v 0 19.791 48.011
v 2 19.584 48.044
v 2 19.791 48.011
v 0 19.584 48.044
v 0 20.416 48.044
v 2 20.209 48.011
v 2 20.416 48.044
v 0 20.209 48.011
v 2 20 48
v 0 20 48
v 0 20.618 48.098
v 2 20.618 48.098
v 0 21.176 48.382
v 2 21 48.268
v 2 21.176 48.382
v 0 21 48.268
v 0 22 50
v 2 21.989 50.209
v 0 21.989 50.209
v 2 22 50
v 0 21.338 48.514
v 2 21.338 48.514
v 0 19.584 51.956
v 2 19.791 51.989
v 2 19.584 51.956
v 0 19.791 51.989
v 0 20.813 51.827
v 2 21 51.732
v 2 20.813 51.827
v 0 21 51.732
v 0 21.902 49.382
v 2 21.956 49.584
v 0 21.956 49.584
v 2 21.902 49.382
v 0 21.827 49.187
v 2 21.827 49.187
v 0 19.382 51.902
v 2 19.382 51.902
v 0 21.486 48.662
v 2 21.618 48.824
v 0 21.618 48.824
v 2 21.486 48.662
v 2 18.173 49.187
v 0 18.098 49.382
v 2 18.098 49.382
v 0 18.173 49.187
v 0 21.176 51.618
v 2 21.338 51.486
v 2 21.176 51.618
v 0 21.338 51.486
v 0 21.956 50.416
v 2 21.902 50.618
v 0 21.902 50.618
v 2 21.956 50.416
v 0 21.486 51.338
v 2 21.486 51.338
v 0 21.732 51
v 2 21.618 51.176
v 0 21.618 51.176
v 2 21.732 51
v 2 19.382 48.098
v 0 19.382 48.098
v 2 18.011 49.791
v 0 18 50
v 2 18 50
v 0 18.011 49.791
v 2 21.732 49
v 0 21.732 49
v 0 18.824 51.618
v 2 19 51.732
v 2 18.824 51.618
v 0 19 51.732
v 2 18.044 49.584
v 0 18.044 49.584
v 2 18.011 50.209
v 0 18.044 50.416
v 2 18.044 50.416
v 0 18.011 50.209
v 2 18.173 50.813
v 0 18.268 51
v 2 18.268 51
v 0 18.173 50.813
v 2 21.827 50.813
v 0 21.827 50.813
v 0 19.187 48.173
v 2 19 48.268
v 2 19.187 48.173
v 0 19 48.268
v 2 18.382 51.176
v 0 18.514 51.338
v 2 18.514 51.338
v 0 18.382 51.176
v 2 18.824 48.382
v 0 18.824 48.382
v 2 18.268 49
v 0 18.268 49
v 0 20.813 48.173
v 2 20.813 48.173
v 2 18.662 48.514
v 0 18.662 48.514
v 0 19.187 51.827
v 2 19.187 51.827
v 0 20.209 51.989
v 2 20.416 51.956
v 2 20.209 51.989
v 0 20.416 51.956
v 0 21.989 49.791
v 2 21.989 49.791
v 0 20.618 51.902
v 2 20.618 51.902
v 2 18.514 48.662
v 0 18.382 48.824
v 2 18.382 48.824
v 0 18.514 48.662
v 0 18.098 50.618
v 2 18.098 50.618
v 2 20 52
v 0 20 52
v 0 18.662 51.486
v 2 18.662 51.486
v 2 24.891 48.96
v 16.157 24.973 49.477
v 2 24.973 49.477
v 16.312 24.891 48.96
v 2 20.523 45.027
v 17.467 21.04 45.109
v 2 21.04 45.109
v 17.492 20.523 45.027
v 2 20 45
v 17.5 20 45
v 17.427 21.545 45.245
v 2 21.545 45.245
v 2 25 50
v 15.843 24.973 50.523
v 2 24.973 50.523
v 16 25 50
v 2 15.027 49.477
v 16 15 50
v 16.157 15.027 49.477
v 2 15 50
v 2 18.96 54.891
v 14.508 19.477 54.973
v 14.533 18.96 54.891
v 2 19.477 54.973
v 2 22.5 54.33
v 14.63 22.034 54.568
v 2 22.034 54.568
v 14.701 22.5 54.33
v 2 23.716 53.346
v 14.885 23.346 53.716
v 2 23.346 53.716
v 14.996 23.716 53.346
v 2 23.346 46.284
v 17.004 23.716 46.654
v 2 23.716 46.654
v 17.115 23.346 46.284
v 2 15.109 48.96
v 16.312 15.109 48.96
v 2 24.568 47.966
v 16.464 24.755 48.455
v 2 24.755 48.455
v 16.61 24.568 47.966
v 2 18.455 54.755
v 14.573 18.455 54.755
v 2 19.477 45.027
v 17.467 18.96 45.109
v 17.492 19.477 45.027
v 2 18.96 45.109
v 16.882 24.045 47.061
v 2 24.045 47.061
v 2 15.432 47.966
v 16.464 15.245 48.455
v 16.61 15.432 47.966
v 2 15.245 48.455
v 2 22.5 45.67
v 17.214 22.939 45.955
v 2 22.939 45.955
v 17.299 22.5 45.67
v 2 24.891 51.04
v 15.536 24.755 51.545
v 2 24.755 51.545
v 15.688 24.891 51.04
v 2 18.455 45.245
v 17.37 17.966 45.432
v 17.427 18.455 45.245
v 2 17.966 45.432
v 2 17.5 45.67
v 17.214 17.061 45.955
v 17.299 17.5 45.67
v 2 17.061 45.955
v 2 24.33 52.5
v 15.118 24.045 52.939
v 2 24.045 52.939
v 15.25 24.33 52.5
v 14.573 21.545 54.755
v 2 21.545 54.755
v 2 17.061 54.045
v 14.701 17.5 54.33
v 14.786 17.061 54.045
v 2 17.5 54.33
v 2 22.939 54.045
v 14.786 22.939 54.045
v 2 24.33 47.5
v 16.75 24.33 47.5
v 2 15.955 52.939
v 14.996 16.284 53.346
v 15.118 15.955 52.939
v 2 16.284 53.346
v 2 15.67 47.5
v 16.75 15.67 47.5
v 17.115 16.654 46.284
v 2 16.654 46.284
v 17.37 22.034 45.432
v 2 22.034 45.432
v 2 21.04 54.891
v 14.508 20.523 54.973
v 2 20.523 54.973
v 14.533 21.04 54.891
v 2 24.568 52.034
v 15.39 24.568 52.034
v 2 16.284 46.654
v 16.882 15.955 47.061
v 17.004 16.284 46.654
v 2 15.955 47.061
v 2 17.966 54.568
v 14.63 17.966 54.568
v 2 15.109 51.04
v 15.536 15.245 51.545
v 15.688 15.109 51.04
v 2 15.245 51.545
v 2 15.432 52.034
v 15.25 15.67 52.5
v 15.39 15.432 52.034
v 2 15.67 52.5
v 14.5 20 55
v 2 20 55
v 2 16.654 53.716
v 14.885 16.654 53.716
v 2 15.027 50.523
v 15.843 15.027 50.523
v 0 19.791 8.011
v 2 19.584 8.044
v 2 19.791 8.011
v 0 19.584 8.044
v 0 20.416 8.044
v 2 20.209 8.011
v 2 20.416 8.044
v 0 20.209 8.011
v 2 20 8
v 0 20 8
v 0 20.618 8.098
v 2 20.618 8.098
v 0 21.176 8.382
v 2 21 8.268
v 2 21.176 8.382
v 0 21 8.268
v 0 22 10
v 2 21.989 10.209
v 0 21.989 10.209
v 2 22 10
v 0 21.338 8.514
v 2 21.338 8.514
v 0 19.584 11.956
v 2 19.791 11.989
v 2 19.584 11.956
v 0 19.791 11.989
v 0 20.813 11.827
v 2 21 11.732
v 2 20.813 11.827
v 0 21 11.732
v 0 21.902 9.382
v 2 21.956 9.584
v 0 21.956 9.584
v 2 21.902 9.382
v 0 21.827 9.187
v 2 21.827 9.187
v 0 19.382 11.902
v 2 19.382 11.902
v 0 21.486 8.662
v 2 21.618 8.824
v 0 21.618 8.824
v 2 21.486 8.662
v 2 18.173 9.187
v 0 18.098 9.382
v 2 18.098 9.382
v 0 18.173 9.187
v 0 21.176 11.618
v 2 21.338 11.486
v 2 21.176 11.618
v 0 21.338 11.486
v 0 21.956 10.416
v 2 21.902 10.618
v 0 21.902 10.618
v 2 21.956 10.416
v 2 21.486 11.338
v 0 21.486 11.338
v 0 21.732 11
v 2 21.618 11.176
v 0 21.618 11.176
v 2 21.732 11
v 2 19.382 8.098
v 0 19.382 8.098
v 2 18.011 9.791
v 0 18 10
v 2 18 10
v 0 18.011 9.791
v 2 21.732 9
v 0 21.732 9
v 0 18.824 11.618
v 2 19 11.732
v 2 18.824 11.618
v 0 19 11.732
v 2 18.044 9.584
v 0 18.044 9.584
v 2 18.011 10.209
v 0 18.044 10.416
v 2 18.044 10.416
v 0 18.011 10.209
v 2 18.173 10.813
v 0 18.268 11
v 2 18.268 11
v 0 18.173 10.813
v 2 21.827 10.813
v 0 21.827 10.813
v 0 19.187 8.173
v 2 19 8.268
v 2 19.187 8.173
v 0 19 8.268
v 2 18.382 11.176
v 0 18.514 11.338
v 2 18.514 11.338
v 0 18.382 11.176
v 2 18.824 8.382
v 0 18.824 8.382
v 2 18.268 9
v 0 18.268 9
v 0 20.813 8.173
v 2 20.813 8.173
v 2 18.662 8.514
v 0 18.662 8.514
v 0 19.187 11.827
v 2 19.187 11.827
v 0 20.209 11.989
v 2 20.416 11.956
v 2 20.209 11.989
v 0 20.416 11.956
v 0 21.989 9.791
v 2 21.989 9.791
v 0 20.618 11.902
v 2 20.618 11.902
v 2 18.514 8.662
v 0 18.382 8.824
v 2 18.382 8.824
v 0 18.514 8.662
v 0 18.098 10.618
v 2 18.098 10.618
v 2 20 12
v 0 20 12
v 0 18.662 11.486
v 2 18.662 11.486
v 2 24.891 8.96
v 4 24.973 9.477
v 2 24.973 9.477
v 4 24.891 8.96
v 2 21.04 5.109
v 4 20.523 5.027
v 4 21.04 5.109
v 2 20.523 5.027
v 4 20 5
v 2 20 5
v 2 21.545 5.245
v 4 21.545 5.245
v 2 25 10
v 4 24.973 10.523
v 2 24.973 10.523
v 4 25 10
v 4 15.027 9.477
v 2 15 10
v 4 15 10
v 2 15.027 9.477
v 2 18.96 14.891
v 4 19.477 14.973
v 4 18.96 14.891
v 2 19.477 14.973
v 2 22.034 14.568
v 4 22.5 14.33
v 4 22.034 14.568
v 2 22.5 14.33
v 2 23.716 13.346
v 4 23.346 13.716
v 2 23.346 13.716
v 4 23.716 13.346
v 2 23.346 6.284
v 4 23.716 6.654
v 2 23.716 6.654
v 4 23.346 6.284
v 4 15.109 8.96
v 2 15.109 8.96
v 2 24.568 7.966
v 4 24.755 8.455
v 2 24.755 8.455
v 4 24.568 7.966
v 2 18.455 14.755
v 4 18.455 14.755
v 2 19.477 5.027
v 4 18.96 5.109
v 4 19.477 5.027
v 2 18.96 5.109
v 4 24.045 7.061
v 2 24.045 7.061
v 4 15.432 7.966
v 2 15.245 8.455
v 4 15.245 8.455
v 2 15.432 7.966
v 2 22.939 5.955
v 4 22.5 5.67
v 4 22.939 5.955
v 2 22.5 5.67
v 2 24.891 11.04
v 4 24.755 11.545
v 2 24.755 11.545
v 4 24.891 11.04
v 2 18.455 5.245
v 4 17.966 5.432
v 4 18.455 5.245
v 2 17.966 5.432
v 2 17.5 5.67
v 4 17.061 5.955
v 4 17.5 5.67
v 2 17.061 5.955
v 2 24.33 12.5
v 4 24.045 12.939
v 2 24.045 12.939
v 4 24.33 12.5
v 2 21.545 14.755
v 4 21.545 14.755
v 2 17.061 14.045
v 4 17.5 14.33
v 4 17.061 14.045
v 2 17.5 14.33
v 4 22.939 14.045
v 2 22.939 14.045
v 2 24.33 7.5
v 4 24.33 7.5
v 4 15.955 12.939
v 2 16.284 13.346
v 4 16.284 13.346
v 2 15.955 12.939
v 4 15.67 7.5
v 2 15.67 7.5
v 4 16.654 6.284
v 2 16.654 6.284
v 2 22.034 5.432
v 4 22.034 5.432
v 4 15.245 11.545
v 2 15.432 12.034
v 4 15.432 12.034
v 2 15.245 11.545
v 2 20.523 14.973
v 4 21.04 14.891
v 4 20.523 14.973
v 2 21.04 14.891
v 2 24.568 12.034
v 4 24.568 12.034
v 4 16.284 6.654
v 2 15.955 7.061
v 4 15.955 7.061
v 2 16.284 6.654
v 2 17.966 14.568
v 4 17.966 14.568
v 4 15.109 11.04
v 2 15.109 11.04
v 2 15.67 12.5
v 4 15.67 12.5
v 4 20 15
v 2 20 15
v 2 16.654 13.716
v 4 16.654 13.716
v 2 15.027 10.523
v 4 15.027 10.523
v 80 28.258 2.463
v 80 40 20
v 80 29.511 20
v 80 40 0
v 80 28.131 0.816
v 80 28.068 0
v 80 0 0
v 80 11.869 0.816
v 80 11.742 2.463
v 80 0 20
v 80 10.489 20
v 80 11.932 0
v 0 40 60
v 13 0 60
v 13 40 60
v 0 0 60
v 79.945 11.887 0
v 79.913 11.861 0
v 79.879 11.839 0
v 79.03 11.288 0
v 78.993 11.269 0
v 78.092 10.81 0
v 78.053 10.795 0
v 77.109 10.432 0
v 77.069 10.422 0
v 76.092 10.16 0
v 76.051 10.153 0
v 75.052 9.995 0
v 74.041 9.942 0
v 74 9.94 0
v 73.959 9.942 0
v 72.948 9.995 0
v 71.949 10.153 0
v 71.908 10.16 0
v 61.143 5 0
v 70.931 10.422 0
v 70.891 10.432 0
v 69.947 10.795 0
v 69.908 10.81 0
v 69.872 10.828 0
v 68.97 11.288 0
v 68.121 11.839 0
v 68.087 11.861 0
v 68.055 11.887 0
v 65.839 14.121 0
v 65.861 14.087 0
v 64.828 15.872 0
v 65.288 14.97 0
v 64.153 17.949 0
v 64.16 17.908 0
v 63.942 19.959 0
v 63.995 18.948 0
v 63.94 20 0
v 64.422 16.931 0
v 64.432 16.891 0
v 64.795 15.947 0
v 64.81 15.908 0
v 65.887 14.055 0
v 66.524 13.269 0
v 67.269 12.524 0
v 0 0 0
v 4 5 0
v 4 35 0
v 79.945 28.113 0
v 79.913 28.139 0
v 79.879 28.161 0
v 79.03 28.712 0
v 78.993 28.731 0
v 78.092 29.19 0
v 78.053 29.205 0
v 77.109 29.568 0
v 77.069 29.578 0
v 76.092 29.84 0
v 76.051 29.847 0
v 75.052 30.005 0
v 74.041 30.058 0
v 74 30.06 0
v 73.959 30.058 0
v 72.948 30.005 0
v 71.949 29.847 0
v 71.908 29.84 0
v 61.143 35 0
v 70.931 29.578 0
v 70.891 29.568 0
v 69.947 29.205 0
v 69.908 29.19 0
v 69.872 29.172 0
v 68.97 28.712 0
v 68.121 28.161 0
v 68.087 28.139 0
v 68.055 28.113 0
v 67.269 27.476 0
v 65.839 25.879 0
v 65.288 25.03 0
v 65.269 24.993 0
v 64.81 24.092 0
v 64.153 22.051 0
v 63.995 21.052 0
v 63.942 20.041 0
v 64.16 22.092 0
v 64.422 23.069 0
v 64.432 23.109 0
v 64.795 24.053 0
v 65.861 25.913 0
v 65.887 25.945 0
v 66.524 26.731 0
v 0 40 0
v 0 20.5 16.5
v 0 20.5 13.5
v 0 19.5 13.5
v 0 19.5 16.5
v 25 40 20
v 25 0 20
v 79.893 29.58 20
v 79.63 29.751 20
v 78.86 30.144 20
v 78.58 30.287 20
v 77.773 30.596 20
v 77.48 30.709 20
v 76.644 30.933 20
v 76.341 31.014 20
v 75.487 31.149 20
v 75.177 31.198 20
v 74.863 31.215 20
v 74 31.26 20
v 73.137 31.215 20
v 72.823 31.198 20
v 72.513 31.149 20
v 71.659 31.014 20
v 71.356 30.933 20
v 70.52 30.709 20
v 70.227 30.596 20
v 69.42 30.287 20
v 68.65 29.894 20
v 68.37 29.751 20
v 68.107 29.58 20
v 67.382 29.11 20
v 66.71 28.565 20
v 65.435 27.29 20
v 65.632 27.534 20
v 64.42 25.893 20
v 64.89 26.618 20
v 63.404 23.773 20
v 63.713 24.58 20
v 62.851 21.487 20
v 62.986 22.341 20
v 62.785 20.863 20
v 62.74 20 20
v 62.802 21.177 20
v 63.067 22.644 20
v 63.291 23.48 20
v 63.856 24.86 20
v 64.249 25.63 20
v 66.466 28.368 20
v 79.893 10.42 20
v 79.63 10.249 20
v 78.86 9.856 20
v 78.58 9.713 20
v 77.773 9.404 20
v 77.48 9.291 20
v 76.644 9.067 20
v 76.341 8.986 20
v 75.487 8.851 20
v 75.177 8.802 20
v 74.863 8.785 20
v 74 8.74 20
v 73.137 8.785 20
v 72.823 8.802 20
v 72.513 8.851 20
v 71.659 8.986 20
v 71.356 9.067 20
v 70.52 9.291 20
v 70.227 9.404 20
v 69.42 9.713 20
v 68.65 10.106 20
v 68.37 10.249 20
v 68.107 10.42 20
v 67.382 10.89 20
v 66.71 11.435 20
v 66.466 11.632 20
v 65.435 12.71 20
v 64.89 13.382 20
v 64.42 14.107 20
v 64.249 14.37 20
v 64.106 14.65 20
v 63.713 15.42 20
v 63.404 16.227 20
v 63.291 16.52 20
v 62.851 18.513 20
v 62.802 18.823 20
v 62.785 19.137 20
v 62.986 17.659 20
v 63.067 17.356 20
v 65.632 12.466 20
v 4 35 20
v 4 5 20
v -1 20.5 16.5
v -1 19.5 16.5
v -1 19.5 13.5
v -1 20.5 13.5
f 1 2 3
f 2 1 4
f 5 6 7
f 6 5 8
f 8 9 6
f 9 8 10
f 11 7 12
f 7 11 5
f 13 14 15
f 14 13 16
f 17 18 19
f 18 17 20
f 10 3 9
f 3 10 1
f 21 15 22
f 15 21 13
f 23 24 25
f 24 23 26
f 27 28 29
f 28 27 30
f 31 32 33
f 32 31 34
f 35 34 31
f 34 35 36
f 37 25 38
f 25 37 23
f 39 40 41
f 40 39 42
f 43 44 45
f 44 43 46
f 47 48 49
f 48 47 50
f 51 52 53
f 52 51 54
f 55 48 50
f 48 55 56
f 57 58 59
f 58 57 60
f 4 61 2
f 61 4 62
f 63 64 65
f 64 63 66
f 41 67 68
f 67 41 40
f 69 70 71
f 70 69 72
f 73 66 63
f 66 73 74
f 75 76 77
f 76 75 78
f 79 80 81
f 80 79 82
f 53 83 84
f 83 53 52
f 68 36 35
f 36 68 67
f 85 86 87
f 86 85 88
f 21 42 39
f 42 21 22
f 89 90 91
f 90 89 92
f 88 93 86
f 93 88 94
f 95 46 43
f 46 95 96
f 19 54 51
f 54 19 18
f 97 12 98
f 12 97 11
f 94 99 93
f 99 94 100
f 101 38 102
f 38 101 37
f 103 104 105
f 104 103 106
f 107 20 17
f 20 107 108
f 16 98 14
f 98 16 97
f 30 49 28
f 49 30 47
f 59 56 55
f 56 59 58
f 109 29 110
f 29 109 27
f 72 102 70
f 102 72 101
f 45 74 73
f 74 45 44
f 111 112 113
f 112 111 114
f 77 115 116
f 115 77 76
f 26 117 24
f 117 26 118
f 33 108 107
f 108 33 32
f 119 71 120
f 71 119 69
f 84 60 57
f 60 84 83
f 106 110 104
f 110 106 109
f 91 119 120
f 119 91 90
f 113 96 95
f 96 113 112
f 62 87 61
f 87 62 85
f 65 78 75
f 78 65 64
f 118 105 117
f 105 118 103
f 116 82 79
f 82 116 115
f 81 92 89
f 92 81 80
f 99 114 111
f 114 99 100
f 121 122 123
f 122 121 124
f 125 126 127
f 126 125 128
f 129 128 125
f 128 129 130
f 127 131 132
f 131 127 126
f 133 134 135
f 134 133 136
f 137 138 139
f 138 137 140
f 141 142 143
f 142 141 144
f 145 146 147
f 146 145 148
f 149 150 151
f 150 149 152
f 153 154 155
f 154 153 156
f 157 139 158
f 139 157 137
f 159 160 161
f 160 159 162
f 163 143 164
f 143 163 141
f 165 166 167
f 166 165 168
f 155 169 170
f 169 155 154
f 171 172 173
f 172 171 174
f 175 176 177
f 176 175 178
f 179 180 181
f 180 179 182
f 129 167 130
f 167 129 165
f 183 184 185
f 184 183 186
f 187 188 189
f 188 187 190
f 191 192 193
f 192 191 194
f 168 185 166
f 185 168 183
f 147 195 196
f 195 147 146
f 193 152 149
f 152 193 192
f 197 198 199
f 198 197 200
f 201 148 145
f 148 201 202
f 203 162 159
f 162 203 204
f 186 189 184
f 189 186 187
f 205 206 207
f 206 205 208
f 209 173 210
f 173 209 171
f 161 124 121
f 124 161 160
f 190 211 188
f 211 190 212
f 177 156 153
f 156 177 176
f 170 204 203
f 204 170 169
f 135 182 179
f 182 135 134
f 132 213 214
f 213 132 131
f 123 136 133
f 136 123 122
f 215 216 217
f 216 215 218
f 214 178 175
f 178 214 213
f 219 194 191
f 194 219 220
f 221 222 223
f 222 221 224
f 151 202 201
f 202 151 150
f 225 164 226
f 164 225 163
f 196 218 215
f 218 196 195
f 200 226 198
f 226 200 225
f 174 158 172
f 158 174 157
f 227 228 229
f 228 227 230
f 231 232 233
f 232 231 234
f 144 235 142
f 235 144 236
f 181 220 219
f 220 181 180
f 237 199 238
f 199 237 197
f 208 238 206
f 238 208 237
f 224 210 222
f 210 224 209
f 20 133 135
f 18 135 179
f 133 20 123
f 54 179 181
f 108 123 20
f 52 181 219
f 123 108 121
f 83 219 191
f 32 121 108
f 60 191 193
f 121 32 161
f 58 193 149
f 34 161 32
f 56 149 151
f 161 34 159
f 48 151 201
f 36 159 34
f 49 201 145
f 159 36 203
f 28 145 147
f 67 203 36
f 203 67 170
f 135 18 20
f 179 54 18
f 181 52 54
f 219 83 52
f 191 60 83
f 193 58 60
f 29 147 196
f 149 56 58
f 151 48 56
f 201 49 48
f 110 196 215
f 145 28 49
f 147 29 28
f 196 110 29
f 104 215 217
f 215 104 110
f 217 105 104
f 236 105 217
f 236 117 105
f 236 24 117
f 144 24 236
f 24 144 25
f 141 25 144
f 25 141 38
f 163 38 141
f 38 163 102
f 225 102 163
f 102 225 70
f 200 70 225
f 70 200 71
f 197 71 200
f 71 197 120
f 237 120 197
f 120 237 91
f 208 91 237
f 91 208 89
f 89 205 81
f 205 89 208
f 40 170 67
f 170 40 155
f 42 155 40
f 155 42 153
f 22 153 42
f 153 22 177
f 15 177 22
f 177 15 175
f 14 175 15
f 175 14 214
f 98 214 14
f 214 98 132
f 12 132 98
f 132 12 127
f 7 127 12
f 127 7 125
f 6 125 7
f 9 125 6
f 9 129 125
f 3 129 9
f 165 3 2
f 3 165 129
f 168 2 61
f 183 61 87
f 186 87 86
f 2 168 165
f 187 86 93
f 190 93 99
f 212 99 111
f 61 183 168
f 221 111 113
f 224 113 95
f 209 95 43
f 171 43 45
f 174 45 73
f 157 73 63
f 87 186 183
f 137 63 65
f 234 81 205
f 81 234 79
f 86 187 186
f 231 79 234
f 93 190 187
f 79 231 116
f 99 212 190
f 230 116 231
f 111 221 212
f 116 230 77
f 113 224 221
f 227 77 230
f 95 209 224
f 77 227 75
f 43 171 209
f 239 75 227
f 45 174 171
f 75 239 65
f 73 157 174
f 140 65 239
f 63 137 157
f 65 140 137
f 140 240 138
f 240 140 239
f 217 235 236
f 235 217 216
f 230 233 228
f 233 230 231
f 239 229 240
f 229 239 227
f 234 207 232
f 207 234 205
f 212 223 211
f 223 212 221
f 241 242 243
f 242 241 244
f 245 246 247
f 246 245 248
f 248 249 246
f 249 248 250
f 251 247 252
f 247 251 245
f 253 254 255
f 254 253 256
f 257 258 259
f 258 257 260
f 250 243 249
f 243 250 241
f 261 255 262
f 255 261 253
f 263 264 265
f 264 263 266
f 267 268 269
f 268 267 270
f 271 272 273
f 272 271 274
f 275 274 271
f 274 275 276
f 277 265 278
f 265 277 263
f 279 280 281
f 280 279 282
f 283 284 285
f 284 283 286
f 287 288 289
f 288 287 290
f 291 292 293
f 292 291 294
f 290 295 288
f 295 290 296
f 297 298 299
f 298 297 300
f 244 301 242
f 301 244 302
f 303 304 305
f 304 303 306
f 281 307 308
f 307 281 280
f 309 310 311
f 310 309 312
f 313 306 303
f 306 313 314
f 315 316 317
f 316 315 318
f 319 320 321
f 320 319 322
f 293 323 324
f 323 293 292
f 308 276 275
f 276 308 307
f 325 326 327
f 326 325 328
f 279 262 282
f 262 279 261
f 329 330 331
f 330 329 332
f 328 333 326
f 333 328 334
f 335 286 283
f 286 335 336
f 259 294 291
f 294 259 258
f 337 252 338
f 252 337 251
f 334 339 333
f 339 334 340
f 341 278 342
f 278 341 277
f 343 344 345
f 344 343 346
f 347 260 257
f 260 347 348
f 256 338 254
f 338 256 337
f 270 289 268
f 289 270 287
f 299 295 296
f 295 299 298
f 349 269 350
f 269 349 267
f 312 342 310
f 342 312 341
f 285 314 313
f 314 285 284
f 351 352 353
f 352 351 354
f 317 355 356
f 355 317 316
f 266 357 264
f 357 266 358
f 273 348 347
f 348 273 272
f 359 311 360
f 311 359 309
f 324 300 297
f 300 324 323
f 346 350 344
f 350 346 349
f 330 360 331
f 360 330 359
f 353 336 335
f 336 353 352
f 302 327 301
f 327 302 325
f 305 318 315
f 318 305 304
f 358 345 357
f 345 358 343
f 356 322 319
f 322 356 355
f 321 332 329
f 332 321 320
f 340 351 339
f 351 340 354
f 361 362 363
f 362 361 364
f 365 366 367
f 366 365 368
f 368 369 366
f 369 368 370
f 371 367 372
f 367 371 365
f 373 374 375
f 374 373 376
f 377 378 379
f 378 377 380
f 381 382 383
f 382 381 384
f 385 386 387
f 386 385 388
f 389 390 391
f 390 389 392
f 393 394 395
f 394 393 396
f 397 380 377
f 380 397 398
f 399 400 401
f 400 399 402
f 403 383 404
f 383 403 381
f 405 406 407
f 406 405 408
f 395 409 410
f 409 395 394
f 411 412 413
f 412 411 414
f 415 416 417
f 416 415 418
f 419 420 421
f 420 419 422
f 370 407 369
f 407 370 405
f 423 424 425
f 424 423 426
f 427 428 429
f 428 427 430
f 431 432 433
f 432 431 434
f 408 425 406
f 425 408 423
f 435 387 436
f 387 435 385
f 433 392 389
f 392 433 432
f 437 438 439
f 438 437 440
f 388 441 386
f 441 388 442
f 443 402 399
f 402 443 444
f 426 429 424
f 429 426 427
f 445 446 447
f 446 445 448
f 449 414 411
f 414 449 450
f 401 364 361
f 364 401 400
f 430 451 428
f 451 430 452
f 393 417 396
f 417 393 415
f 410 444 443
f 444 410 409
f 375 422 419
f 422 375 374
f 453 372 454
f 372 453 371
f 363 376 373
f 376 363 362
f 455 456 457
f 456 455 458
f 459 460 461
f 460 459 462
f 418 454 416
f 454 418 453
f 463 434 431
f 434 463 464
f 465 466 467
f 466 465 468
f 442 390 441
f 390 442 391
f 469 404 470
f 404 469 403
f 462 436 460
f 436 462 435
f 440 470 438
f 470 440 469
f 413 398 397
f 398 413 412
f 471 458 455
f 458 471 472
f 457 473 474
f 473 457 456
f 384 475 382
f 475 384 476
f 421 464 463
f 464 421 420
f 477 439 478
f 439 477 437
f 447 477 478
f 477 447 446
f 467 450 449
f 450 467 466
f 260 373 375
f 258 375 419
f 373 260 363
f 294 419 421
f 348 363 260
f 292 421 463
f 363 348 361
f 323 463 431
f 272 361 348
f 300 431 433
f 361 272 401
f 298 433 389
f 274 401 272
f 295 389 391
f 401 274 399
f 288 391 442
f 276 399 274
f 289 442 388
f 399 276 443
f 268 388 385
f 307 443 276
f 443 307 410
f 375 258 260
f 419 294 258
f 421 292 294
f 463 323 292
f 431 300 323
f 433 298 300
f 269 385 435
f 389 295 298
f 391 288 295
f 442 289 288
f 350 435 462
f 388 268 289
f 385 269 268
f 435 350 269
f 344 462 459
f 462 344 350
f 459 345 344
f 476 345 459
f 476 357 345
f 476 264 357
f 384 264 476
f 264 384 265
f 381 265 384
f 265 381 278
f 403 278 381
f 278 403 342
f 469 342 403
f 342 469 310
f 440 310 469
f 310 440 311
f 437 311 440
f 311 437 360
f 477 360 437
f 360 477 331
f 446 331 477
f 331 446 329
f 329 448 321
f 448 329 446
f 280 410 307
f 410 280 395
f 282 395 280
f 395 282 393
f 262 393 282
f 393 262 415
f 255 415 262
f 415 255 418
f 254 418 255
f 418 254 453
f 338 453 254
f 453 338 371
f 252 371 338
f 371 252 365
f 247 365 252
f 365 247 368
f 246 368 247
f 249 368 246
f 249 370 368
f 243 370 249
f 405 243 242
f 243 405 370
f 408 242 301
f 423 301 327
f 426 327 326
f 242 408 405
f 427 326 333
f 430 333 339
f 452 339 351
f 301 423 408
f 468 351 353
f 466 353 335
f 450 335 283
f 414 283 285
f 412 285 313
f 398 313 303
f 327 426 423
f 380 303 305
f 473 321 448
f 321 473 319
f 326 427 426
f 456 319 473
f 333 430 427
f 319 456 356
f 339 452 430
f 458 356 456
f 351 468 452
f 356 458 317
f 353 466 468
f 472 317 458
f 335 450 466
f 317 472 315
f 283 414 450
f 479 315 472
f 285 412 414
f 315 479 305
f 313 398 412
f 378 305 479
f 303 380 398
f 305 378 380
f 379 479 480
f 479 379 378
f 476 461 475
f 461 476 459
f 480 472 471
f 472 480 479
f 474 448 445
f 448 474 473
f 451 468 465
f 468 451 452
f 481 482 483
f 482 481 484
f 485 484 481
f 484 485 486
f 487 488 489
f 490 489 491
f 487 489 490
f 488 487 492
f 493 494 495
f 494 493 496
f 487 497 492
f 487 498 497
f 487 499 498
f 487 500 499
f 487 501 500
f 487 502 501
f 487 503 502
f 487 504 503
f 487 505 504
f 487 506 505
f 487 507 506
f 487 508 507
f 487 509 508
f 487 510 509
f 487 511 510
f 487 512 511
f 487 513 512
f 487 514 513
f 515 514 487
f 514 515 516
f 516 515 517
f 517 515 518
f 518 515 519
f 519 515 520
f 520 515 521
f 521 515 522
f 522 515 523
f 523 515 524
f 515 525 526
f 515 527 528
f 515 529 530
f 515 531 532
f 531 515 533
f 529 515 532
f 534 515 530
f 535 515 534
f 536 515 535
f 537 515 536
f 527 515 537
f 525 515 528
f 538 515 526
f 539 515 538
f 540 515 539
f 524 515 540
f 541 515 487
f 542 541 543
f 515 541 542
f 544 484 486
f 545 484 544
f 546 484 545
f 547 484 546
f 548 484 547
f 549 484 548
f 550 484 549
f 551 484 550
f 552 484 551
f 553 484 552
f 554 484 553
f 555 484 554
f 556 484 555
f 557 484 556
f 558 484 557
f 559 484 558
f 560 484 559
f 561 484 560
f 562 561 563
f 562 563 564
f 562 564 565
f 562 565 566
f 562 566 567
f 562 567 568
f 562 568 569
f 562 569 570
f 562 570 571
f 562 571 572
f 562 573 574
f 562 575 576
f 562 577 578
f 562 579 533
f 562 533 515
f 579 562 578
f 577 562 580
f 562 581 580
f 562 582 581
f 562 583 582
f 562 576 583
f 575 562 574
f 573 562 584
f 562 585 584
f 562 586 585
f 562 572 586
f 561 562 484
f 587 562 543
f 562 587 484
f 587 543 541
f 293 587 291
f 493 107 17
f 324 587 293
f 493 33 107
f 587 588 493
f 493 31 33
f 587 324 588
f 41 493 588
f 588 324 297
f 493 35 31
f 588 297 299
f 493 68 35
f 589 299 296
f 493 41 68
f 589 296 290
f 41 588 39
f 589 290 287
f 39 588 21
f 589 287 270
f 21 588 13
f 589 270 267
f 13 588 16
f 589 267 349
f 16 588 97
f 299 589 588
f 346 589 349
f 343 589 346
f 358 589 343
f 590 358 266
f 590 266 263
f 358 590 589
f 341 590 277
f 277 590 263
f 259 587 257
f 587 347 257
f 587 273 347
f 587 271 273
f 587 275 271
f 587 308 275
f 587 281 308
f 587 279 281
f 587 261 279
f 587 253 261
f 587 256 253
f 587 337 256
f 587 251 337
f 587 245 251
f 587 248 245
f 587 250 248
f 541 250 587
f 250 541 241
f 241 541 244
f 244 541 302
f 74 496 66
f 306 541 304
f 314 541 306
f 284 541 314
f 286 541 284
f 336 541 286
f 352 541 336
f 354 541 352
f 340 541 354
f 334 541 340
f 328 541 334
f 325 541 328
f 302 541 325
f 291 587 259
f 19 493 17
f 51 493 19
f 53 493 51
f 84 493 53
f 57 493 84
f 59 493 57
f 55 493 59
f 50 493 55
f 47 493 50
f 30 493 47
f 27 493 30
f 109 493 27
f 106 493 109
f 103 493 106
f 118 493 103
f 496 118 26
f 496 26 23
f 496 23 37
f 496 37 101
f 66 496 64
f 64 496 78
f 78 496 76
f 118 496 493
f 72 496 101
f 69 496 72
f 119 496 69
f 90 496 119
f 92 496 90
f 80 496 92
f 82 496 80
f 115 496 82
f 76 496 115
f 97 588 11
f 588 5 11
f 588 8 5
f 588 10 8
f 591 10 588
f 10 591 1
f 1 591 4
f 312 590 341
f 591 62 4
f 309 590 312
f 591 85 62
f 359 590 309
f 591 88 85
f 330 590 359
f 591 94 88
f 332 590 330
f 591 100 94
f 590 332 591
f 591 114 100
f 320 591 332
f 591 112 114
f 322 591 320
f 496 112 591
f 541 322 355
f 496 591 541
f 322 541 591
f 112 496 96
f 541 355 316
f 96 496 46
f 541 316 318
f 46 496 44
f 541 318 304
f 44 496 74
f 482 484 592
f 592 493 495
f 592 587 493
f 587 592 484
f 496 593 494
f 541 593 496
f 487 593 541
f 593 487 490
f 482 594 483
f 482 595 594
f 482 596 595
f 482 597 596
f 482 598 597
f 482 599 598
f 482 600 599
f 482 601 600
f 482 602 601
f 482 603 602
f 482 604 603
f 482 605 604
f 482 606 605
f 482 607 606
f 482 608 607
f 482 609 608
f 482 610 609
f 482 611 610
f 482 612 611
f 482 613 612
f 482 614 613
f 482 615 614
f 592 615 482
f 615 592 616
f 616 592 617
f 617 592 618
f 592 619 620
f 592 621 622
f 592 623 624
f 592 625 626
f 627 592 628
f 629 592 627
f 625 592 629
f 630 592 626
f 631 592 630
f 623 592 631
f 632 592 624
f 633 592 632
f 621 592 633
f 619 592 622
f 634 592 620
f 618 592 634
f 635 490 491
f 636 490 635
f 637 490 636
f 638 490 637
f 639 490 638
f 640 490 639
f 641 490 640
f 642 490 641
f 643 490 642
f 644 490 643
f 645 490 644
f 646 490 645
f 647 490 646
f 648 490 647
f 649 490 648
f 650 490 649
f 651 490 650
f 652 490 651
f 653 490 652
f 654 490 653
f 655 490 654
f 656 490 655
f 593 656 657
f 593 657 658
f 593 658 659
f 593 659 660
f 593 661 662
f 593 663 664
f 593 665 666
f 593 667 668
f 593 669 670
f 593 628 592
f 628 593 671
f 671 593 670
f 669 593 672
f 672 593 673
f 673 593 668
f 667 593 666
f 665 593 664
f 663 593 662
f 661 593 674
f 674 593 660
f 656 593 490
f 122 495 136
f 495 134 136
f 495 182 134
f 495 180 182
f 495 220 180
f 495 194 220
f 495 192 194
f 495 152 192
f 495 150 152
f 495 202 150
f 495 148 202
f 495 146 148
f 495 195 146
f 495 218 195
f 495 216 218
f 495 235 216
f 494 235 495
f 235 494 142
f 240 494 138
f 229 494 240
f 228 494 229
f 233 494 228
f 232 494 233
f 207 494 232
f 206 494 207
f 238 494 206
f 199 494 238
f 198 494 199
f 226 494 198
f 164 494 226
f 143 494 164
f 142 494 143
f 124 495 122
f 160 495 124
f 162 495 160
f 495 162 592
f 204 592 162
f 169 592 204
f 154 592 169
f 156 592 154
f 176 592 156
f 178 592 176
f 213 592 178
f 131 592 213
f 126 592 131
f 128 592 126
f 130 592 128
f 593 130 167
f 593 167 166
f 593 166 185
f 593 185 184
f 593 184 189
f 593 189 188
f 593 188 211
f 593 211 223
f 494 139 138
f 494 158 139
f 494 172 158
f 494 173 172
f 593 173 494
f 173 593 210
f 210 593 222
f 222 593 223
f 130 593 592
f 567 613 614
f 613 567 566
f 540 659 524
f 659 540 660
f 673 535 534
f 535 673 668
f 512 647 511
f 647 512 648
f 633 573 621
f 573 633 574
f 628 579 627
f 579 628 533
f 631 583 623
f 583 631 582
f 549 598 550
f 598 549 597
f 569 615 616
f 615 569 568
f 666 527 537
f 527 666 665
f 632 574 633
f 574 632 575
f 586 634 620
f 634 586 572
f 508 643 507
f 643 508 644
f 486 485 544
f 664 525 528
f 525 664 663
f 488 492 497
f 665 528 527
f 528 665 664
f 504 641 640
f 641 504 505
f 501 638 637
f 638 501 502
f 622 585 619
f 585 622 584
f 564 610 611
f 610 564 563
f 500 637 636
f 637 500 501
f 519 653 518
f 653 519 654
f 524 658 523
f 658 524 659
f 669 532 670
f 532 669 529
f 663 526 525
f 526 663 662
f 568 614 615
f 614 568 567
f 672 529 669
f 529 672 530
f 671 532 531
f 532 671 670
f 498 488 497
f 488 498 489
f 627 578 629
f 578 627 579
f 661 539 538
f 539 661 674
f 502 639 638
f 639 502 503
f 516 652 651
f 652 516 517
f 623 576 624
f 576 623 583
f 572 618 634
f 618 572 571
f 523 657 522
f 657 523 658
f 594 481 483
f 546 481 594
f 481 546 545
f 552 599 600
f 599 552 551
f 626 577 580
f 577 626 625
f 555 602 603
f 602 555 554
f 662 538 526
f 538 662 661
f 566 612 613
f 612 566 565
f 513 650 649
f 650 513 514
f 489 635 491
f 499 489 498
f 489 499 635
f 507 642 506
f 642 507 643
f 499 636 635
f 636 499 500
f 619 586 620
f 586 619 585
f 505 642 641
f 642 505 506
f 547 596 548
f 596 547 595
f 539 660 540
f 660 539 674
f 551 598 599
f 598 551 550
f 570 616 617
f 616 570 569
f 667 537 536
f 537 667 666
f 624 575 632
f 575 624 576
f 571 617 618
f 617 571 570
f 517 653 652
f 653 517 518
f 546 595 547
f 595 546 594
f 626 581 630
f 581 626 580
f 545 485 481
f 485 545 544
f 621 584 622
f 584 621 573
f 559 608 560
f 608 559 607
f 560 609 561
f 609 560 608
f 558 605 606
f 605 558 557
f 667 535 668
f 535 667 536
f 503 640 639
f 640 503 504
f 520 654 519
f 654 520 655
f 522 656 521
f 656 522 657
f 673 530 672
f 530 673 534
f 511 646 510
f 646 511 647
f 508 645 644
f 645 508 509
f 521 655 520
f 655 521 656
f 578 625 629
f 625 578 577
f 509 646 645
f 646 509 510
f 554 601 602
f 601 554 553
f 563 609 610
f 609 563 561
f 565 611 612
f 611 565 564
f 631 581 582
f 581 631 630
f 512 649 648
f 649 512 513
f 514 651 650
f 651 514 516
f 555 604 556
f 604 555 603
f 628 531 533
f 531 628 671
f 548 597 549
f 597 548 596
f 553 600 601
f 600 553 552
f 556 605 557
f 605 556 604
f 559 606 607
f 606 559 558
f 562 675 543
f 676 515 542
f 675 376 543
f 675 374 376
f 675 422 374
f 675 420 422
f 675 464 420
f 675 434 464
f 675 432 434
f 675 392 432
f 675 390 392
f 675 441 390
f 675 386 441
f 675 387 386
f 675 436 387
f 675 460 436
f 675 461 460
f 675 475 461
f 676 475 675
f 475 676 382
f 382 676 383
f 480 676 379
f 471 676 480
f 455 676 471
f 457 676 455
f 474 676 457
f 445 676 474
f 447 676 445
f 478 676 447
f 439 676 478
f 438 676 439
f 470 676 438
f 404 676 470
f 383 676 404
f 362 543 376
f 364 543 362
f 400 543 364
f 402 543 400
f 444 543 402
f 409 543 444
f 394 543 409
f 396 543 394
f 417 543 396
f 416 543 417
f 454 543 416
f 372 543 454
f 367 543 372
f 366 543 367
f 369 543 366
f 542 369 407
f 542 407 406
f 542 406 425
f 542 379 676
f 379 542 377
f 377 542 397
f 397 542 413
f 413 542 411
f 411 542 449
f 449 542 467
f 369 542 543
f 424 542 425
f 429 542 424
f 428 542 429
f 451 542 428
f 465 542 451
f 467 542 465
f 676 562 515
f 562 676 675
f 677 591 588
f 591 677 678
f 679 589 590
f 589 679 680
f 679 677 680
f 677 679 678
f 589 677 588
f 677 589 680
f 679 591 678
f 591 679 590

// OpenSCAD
//count of fragments for cylinders etc.
$fn=60; 
//length, min. 70mm
length=80; 

//upper holder diameter
SHDia2=23.6;
//lower holder diameter
SHDia1=20; 

difference() {
    cube([length,40,60]);
    //Neckline above - Ausschnitt oben
    translate([10,45,70]){
        rotate([90,90,0]) {
            linear_extrude(height = 50, center = false, convexity = 10, twist = 0)
            polygon(points=[[0,0],[50,15],[50,length],[0,length]]);
        }
    }
    
    //Holder hole (slightly larger than the part of the showerhead)
    translate([length-6,20,-1])
    cylinder(30,d1=SHDia1,d2=SHDia2);
    
    //hole screw
    translate([14,20,50]) {
        rotate([0,90,0]) {
        cylinder(30,2,2,center=true);
        cylinder(24,5,5,center=true);
        }
    }
    //hole screw below
    translate([9,20,10]) {
        rotate([0,90,0]) {
        cylinder(20,2,2,center=true);
        cylinder(14,5,5,center=true);
        }
    }
    //wedge cut below
    translate([4,20,20]){
        rotate([90,90,0]) {
            linear_extrude(height = 30, center = true, convexity = 10, twist = 0)
            polygon(points=[[0,0],[21,0],[21,60]]);
        }
    }
}

//some fixation
translate([-0.5,20,15])
cube([1,1,3],center=true);
